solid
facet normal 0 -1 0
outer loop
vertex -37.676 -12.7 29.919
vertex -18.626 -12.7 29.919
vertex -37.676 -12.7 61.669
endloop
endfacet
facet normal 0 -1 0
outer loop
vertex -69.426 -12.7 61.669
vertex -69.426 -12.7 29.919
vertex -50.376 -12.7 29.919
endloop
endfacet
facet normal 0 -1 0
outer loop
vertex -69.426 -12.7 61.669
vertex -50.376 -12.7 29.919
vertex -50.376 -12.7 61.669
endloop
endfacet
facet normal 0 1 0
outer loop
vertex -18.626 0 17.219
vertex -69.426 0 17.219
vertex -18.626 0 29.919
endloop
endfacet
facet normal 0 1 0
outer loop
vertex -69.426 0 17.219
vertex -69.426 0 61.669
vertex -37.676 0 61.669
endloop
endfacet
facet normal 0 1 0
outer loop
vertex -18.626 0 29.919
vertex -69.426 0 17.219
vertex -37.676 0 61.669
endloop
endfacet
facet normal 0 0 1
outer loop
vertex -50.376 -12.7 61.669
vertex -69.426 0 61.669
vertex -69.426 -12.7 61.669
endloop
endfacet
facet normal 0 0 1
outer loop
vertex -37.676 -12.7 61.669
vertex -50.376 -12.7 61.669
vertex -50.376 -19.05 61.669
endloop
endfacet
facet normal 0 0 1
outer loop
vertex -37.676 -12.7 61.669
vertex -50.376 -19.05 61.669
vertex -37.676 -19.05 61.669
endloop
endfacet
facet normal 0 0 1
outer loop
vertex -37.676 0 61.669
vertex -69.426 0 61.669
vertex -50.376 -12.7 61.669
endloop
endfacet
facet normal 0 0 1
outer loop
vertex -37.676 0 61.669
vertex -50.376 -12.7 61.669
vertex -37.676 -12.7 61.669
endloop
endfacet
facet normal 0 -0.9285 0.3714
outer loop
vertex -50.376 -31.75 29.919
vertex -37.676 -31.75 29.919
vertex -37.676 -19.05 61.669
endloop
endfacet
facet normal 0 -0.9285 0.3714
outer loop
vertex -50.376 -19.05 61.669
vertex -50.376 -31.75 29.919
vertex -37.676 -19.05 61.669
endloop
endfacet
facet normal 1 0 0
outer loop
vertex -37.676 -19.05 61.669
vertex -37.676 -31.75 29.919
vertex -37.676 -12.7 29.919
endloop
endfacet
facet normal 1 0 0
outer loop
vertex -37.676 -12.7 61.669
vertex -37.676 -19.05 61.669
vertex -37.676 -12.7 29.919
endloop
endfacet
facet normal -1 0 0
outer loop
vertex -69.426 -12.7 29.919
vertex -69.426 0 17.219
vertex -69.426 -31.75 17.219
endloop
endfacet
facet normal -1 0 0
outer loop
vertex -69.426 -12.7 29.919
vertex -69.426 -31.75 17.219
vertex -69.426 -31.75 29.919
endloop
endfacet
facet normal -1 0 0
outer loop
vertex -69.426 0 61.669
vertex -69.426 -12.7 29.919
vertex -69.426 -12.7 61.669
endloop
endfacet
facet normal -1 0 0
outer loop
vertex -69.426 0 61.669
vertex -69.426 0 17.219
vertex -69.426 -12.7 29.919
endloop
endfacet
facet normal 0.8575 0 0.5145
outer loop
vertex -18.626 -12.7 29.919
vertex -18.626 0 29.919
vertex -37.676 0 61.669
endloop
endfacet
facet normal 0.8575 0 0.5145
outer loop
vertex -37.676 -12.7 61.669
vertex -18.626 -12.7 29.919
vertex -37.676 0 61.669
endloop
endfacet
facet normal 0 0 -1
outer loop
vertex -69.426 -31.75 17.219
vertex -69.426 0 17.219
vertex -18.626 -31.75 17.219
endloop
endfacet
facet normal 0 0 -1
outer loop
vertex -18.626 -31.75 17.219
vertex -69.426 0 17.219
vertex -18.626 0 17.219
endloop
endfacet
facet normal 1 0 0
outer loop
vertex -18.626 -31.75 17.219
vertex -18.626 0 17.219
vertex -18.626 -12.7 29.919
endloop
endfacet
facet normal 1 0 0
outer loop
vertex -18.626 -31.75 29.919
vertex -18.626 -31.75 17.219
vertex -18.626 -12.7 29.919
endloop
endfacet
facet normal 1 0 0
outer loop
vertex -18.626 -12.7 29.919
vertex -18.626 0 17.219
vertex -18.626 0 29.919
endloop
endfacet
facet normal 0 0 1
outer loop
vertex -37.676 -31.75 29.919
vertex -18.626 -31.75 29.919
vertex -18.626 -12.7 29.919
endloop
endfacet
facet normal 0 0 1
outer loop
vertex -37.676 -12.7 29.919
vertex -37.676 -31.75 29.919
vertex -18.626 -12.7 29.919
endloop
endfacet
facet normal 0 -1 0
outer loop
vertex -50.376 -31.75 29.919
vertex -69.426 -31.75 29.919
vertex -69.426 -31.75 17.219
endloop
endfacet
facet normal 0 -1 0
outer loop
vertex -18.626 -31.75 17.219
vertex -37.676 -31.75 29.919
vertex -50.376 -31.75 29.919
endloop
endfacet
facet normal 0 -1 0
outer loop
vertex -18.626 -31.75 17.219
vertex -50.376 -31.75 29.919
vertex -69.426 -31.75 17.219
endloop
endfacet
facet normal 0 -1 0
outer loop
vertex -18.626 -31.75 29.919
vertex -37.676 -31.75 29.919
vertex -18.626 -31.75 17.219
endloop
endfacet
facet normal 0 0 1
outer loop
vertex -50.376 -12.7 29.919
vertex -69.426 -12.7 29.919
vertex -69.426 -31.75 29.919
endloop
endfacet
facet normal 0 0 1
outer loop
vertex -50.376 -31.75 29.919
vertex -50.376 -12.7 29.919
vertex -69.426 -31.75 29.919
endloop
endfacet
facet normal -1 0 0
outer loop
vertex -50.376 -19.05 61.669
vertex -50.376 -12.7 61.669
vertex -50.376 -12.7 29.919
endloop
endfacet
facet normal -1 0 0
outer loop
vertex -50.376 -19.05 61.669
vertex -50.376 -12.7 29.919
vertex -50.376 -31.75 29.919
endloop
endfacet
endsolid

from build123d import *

# Parameters (mm, degrees)
F0_W     = 50.8
F0_H     = 44.45
F1_DEPTH = 31.75
F2_W     = 19.05
F2_H     = 31.75
F3_DEPTH = 19.05
F5_DEPTH = 12.7
F7_DEPTH = 12.7
F8_W     = 19.05
F8_H     = 31.75
F9_DEPTH = 19.05


with BuildPart() as f1:
    # F0 (on Front) → F1 (new body)
    with BuildSketch(Plane.XZ):
        with Locations((-44.0256018192, 39.4437830464)):
            Rectangle(F0_W, F0_H)
    extrude(amount=F1_DEPTH)

    # F2 (on face) → F3 (cut)
    with BuildSketch(Plane.YZ.offset(-18.6256018192)):
        with Locations((-22.225, 45.7937830464)):
            Rectangle(F2_W, F2_H)
    extrude(amount=-F3_DEPTH, mode=Mode.SUBTRACT)

    # F4 (on face) → F5 (cut)
    with BuildSketch(Plane(origin=(0, 0, 0), x_dir=(-1, 0, 0), z_dir=(0, 1, 0))):
        Polygon((18.6256018192, 29.9187830464), (37.6756018192, 61.6687830464), (18.6256018192, 61.6687830464), align=None)
    extrude(amount=-F5_DEPTH, mode=Mode.SUBTRACT)

    # F6 (on face) → F7 (cut)
    with BuildSketch(Plane.YZ.offset(-37.6756018192)):
        Polygon((-31.75, 29.9187830464), (-19.05, 61.6687830464), (-31.75, 61.6687830464), align=None)
    extrude(amount=-F7_DEPTH, mode=Mode.SUBTRACT)

    # F8 (on face) → F9 (cut)
    with BuildSketch(Plane(origin=(-69.4256018192, 0, 0), x_dir=(0, -1, 0), z_dir=(-1, 0, 0))):
        with Locations((22.225, 45.7937830464)):
            Rectangle(F8_W, F8_H)
    extrude(amount=-F9_DEPTH, mode=Mode.SUBTRACT)


solid = f1.part
